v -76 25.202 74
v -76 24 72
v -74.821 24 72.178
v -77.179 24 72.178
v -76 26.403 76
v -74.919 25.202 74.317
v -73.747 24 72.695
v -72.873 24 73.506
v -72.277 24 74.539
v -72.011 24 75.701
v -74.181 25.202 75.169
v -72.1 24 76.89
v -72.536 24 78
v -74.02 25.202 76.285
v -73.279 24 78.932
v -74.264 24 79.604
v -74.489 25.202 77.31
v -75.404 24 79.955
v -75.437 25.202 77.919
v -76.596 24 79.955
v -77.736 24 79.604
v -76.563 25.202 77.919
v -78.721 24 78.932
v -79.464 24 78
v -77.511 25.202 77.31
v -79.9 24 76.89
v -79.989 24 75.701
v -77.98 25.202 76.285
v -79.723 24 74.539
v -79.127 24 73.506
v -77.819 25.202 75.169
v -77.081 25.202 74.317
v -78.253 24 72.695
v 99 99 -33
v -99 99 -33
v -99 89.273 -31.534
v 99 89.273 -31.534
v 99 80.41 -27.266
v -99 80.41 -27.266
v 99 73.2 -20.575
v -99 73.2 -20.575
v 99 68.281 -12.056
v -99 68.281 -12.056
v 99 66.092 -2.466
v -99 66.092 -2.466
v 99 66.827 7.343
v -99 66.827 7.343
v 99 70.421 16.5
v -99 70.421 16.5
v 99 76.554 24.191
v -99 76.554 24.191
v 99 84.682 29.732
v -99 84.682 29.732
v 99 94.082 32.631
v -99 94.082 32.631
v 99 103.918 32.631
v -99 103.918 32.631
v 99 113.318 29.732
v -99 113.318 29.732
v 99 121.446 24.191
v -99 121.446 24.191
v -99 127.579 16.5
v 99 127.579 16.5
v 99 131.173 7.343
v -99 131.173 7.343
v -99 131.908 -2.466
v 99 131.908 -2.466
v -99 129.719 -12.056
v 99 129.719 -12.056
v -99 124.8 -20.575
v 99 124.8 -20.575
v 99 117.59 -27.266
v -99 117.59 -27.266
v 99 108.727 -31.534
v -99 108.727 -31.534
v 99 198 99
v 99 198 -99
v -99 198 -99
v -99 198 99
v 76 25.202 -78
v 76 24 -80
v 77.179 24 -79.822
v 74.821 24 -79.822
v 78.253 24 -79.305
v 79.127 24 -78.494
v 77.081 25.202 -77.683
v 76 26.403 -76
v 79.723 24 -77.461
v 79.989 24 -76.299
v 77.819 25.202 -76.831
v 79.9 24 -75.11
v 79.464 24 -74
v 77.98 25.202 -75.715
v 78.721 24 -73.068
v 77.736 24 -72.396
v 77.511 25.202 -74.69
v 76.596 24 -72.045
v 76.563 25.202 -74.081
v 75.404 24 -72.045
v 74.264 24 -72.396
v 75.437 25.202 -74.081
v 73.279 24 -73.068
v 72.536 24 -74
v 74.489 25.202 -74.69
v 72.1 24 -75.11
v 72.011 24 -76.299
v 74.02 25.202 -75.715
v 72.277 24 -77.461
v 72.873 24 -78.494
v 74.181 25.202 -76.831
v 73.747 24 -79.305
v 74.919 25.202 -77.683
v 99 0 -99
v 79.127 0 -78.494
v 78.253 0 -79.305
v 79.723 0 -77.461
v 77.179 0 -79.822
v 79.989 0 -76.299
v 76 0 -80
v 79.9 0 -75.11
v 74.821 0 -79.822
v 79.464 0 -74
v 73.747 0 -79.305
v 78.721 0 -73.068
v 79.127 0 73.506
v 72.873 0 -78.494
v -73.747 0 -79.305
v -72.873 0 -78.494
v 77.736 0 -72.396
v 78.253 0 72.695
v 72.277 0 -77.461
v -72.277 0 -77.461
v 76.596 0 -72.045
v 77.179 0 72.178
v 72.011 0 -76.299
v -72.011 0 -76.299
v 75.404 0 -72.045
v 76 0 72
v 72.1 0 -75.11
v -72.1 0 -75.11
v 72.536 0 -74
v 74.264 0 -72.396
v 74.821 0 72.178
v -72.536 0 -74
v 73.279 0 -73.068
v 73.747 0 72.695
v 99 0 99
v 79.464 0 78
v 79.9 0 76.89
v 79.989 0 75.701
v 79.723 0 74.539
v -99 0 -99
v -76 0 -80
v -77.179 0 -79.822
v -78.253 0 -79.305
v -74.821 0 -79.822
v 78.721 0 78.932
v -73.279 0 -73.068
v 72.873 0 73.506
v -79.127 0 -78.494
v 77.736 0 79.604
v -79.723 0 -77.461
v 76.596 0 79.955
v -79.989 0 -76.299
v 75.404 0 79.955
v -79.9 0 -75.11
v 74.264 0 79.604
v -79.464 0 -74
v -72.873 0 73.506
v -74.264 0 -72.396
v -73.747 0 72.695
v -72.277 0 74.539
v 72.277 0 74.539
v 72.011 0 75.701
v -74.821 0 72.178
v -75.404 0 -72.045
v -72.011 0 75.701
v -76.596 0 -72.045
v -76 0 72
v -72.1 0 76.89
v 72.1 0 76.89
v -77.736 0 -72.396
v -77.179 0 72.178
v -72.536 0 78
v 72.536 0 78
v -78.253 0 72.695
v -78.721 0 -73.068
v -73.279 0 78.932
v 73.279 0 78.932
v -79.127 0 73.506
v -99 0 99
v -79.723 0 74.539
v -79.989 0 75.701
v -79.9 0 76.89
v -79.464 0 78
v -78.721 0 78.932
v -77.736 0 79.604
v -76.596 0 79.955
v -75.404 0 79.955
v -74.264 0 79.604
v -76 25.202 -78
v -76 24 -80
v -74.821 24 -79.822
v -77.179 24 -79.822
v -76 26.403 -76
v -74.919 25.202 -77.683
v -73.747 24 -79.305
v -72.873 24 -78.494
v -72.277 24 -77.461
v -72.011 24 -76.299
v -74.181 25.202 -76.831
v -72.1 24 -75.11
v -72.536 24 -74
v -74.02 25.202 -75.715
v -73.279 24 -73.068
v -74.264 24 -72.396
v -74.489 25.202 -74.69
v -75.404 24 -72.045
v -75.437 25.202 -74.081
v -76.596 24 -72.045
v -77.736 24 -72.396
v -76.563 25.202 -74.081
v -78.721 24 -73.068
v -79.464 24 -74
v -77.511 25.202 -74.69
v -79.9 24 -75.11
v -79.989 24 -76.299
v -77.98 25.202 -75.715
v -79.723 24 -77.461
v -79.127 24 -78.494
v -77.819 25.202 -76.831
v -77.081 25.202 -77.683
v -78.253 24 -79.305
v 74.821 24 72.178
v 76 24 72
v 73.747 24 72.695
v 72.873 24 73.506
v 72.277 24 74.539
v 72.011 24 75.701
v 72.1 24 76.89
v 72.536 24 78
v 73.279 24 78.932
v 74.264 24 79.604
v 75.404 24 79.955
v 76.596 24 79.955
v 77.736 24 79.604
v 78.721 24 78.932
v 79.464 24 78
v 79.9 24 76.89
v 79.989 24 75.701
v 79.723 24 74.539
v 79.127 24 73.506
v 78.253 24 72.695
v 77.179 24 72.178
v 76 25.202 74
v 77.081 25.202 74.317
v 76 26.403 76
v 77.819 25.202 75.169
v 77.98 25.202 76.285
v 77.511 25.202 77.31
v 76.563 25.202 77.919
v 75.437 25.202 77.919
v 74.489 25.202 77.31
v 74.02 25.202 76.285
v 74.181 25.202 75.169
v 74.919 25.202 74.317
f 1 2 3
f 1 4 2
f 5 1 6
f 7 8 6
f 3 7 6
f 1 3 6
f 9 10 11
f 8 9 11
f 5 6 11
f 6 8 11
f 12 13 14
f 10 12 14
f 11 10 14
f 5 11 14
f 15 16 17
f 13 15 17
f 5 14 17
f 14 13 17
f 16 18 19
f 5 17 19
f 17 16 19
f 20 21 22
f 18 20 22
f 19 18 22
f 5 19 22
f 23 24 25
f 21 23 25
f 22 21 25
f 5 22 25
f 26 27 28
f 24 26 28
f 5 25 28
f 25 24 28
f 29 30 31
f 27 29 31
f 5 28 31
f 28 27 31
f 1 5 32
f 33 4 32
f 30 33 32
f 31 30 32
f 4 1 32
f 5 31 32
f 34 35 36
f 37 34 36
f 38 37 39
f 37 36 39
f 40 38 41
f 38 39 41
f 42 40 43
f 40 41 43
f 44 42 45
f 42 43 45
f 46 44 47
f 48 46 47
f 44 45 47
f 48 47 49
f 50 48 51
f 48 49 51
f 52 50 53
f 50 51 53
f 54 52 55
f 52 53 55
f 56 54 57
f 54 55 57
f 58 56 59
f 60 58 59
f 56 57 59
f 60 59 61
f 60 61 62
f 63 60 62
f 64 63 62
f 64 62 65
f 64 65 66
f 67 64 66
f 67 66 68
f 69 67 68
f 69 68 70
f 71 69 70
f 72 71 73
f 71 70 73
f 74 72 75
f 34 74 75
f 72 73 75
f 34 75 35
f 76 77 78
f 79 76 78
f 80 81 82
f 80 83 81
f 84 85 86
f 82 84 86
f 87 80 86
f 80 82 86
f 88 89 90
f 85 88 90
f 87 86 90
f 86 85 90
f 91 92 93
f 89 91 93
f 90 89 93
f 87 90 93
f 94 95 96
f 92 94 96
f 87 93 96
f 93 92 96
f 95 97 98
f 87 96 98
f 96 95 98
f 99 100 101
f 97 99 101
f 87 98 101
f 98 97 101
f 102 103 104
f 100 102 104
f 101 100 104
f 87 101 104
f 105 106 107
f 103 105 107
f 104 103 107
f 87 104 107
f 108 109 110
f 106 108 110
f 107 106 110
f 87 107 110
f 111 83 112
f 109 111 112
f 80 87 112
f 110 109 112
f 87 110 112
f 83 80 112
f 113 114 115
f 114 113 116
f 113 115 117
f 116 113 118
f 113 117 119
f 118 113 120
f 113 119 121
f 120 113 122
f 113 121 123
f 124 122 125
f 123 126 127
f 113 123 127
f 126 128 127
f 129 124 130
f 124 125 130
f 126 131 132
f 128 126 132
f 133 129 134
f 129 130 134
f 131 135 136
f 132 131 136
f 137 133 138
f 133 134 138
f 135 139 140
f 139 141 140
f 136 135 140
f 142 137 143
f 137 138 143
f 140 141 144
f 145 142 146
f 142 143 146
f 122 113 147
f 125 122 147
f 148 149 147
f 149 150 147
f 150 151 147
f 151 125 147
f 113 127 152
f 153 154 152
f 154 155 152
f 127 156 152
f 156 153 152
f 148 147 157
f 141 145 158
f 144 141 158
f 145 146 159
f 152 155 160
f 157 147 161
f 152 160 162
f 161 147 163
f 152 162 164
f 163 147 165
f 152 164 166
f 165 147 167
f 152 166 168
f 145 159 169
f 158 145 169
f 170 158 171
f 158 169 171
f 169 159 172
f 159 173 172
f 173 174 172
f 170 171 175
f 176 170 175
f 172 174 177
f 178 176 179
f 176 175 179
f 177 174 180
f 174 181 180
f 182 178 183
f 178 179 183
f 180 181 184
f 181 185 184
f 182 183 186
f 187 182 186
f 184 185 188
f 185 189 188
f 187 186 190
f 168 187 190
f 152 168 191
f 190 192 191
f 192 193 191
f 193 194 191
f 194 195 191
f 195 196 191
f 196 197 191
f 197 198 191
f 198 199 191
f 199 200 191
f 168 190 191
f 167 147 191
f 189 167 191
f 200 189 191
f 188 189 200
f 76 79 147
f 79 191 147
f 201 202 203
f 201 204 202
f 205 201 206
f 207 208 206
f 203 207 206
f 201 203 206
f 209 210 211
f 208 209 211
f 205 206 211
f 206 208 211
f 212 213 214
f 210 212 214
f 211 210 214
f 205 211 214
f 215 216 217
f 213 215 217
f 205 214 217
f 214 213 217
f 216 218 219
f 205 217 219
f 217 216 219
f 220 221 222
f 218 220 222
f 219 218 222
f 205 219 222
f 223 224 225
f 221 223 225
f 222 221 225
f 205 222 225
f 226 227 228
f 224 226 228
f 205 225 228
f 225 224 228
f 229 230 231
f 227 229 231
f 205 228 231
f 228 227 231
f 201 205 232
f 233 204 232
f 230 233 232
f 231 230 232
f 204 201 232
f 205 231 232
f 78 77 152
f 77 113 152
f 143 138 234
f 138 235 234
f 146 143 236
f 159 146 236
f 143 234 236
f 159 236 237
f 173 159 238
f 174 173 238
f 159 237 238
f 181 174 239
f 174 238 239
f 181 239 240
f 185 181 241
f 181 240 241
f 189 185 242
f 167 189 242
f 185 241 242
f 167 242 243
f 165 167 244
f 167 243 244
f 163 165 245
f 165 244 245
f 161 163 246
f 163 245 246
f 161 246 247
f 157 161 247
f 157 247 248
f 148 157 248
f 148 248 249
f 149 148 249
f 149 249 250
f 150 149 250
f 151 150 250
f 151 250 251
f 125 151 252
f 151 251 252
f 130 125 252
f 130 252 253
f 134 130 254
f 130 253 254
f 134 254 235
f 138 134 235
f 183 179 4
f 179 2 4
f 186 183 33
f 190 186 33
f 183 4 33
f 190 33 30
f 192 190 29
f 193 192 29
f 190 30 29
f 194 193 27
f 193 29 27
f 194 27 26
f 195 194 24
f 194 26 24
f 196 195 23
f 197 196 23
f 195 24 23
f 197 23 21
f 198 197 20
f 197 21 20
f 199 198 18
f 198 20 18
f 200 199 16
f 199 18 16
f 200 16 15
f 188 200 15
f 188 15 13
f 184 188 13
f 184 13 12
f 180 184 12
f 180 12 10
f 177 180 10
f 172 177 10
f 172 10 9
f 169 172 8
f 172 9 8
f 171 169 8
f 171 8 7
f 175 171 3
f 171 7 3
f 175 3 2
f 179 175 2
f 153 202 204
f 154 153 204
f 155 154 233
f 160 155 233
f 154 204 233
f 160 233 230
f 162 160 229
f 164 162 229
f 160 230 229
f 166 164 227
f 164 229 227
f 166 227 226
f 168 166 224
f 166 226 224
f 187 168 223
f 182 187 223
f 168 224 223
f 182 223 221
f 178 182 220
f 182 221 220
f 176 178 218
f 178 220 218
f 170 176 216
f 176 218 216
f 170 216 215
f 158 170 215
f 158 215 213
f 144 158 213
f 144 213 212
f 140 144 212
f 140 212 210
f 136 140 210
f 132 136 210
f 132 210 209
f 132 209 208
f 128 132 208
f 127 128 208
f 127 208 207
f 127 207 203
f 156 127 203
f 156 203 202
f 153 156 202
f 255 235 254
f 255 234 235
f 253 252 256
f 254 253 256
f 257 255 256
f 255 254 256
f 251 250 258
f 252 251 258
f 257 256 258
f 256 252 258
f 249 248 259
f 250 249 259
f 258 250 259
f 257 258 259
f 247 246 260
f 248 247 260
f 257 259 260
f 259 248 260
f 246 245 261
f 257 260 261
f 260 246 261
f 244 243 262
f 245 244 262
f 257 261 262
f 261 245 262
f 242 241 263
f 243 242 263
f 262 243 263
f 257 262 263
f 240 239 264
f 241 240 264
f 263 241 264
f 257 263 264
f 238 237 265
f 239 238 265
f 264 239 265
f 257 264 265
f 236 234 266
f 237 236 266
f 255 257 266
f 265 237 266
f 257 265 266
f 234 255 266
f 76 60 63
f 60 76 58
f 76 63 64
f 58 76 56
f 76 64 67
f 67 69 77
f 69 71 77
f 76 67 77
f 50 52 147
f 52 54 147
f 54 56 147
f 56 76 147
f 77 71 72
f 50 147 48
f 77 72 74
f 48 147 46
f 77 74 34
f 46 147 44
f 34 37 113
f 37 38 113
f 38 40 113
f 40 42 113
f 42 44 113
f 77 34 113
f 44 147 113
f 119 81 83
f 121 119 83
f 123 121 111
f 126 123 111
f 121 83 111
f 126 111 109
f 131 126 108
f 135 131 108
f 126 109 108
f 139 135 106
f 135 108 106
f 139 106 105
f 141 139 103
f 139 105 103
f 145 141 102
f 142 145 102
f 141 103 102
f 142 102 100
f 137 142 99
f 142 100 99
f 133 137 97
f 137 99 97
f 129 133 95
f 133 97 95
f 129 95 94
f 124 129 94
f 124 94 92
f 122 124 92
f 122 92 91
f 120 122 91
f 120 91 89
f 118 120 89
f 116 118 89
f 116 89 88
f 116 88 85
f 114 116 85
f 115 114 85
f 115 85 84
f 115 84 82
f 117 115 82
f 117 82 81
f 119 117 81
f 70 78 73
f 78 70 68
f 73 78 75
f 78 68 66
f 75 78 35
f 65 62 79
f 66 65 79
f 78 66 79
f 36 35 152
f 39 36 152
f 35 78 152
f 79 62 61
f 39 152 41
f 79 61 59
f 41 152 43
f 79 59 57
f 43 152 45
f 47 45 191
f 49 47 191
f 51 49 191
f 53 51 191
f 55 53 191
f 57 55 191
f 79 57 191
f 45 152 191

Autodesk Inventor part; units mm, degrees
ref_plane "YZ Plane" through (0, 0, 0) normal (1, 0, 0) x (0, 1, 0)
ref_plane "XZ Plane" through (0, 0, 0) normal (0, 1, 0) x (-1, 0, 0)
ref_plane "XY Plane" through (0, 0, 0) normal (0, 0, 1) x (1, 0, 0)
sketch "Sketch1" plane through (0, 0, 0) normal (0, 1, 0) x (-1, 0, 0)
  line L0 (99, 99) -> (-99, 99)
  line L1 (-99, 99) -> (-99, -99)
  line L2 (-99, -99) -> (99, -99)
  line L3 (99, -99) -> (99, 99)
  line L4 (99, 99) -> (-99, -99) construction
  line L5 (-99, 99) -> (99, -99) construction
  point P0 (0, 0)
  dimension "d0" = 198
  dimension "d1" = 198
extrude "Box" add sketch "Sketch1" along normal blind 198
sketch "Sketch2" plane through (99, 0, 99) normal (1, 0, 0) x (0, 0, -1)
  point P0 (99, 0)
  point P1 (99, 99)
hole "DecAxisHole" at (99, 99, 0) direction (-1, 0, 0) diameter 66 depth 198
sketch "Sketch3" plane through (0, 0, 0) normal (0, -1, 0) x (1, 0, 0)
  point P0 (0, 0)
  point P1 (-76, -76)
  point P2 (76, -76)
  point P3 (76, 76)
  point P4 (-76, 76)
hole "BoltHoles" at (-76, 0, -76) at (76, 0, -76) at (76, 0, 76) at (-76, 0, 76) direction (0, 1, 0) diameter 8 depth 24 tip angle 118
properties part number "RaDecConnector"
